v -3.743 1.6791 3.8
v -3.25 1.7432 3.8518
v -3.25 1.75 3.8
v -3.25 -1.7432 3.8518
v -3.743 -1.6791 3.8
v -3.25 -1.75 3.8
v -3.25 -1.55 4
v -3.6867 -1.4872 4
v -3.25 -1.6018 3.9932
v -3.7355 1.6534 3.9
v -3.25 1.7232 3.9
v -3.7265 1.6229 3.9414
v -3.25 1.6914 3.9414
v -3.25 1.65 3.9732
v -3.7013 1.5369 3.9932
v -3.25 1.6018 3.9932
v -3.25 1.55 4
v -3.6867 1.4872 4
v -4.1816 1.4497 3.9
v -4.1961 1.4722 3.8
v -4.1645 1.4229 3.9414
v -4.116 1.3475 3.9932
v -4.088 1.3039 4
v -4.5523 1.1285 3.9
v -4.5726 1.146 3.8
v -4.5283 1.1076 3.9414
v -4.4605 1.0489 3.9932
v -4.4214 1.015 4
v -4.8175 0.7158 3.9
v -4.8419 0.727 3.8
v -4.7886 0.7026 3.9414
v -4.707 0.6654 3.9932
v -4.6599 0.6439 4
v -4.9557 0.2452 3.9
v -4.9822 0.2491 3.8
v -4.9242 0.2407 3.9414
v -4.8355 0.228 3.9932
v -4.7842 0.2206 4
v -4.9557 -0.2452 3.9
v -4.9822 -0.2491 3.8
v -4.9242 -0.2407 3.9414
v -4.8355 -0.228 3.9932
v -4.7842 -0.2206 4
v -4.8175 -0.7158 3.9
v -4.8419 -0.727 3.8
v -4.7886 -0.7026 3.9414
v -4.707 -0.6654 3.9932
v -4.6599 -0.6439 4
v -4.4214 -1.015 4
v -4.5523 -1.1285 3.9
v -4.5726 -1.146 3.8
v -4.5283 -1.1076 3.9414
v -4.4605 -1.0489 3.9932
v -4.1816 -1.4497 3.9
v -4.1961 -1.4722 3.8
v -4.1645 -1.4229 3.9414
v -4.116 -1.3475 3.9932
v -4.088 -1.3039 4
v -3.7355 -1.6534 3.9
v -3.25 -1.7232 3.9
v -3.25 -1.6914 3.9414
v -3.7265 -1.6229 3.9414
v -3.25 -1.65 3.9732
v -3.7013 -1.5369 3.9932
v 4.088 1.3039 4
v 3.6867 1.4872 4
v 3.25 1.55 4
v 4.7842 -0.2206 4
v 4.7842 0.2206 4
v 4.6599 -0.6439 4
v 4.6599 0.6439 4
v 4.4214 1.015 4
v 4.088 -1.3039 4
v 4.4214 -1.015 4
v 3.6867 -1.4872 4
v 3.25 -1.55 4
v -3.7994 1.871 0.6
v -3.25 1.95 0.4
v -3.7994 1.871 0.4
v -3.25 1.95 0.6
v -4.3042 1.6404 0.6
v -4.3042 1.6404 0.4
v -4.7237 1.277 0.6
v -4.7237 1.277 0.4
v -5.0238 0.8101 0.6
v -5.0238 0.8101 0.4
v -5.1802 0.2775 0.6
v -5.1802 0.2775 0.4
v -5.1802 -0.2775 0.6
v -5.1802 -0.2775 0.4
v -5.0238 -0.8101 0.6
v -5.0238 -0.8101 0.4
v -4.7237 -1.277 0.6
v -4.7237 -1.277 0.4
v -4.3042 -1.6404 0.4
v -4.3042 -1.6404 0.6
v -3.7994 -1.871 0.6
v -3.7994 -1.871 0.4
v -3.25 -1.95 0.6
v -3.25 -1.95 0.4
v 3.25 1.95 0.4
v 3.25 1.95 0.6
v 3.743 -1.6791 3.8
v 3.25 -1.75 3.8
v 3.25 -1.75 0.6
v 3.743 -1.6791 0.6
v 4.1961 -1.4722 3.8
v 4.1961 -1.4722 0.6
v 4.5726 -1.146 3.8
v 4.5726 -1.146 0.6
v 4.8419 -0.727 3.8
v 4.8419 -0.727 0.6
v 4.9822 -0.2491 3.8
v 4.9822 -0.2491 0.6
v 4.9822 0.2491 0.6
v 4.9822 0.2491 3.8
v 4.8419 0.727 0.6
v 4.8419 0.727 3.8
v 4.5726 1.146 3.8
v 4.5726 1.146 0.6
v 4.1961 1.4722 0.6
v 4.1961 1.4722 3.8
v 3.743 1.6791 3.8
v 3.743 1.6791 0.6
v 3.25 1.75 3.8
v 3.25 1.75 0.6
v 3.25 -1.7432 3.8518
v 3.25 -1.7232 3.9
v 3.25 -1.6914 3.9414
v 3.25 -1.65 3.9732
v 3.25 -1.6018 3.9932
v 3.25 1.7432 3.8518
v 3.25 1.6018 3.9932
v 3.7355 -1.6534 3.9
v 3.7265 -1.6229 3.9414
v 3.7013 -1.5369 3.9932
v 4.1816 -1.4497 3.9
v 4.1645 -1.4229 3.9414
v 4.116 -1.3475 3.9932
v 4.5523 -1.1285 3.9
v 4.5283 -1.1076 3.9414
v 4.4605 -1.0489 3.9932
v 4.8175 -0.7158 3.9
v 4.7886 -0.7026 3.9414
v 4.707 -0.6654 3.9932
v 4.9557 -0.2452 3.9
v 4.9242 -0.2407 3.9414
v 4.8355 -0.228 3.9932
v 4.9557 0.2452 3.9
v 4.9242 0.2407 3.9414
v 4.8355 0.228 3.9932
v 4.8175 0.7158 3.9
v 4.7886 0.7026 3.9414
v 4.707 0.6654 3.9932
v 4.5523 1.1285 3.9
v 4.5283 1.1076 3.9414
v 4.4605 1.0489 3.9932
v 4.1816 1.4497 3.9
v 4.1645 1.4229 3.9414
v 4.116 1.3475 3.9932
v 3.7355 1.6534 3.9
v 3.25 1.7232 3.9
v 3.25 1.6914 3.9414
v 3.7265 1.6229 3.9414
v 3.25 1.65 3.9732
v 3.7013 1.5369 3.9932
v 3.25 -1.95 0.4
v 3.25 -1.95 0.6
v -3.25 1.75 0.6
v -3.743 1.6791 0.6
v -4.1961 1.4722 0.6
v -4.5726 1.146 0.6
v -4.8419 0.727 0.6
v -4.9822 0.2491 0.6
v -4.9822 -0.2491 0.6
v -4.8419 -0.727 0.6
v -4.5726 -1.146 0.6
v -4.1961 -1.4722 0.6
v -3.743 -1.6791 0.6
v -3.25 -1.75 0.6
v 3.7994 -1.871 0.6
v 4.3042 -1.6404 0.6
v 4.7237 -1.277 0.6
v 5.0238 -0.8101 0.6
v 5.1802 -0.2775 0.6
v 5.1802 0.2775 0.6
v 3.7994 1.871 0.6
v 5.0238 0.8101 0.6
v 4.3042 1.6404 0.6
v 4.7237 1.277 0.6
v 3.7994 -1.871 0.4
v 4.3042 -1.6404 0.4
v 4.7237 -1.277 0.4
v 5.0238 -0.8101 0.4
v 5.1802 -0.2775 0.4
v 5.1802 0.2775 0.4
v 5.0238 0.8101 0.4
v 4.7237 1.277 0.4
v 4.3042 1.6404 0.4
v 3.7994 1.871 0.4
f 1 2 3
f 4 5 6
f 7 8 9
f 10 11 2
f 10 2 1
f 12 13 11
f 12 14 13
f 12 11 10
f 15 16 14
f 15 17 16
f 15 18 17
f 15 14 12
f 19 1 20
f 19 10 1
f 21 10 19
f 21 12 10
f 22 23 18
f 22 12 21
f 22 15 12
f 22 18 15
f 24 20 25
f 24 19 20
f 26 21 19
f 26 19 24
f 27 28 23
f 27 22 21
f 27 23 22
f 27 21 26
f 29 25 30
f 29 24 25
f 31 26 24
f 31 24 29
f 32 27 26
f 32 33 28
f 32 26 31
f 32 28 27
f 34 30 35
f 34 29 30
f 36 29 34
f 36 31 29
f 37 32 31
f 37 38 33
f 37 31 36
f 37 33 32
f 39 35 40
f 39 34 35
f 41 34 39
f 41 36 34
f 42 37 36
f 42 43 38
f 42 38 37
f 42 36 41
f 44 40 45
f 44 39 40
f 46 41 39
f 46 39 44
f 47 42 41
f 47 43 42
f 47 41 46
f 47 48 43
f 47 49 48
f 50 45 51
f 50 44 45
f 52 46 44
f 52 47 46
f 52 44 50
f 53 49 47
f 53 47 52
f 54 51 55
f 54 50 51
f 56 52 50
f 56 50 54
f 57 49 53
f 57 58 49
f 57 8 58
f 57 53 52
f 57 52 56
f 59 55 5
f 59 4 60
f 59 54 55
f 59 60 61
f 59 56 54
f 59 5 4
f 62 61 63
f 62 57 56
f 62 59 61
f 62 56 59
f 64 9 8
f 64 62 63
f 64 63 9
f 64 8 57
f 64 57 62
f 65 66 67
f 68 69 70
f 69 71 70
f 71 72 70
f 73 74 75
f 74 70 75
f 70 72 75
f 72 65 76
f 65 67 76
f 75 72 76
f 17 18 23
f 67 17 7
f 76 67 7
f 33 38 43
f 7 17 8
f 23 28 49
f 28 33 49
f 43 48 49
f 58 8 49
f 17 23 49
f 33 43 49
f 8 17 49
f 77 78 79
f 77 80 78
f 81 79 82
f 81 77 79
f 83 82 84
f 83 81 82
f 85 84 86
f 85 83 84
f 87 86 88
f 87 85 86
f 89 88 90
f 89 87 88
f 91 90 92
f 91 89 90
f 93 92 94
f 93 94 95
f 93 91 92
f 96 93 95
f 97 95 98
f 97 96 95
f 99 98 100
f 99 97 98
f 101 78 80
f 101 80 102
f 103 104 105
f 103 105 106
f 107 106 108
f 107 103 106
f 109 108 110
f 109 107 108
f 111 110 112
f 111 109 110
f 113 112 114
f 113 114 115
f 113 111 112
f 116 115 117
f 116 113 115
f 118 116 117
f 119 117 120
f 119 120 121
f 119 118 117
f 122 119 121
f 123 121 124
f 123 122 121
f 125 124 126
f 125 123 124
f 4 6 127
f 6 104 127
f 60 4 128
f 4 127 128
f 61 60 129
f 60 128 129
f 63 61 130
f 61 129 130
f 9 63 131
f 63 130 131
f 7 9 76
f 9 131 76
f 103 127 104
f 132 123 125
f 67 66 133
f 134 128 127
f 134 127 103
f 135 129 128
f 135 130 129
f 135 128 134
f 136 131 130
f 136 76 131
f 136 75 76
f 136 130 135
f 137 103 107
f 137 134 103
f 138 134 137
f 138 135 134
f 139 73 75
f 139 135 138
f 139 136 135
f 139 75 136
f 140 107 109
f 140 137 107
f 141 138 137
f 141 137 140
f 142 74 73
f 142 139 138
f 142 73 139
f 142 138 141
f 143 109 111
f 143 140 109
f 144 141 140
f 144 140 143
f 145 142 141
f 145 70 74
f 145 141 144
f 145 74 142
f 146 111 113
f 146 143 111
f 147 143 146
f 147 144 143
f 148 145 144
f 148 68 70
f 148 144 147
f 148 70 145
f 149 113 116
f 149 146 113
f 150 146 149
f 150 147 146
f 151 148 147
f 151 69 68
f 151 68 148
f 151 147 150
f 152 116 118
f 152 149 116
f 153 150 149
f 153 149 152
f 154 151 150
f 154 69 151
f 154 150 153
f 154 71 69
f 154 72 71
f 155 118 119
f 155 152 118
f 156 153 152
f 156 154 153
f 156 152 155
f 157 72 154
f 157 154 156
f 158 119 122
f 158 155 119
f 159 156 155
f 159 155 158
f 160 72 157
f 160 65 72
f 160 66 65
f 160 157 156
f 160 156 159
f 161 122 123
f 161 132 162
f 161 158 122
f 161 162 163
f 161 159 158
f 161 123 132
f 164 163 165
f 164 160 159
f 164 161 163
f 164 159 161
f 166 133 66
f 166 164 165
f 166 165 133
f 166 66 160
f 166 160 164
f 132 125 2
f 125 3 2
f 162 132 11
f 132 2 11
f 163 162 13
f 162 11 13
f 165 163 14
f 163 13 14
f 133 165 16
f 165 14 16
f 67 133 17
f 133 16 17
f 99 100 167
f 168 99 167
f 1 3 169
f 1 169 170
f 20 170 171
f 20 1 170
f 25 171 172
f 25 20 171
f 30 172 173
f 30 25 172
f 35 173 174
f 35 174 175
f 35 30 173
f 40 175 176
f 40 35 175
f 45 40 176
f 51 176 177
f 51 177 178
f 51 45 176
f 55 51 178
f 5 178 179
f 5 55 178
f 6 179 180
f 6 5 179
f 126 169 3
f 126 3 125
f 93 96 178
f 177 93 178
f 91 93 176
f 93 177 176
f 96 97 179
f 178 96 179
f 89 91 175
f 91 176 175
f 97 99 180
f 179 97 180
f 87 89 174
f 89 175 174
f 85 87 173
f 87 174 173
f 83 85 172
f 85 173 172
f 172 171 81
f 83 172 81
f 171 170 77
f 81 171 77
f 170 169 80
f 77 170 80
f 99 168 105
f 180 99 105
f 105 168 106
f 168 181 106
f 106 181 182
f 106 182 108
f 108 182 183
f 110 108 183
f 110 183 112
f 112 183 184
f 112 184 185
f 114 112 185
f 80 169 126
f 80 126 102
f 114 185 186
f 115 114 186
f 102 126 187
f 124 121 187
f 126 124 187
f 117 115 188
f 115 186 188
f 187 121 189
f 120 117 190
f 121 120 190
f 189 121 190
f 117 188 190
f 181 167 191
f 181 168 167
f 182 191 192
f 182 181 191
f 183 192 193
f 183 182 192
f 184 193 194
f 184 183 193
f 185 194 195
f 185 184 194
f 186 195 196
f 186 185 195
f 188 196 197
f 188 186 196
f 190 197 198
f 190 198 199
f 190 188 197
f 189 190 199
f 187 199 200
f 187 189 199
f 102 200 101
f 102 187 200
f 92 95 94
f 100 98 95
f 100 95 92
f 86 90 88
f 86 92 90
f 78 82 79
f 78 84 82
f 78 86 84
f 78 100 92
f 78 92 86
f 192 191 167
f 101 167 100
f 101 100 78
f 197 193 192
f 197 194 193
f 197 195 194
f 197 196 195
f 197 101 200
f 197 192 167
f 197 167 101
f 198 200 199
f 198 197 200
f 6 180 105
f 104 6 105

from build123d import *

# Parameters (mm, degrees)
CYLINDER005_W     = 1.75
CYLINDER005_H     = 3.4
CYLINDER005_ANGLE = 180
CYLINDER004_W     = 1.75
CYLINDER004_H     = 3.4
CYLINDER004_ANGLE = 180
BOX010_W          = 6.5
BOX010_H          = 3.9
BOX010_DEPTH      = 0.2
CYLINDER006_W     = 1.95
CYLINDER006_H     = 0.2
CYLINDER006_ANGLE = 180
CYLINDER007_W     = 1.95
CYLINDER007_H     = 0.2
CYLINDER007_ANGLE = 180
BOX009_W          = 6.5
BOX009_H          = 3.5
BOX009_DEPTH      = 3.4
FILLET001_R       = 0.2


with BuildPart() as cylinder005:
    # Cylinder005 → Cylinder005 (revolve)
    with BuildSketch(Plane(origin=(3.25, 0, 0.6), x_dir=(0, -1, 0), z_dir=(-1, 0, 0))):
        with Locations((0.875, 1.7)):
            Rectangle(CYLINDER005_W, CYLINDER005_H)
    revolve(axis=Axis((3.25, 0, 0.6), (0, 0, 1)), revolution_arc=CYLINDER005_ANGLE)


with BuildPart() as cylinder004:
    # Cylinder004 → Cylinder004 (revolve)
    with BuildSketch(Plane(origin=(-3.25, 0, 0.6), x_dir=(0, 1, 0), z_dir=(1, 0, 0))):
        with Locations((0.875, 1.7)):
            Rectangle(CYLINDER004_W, CYLINDER004_H)
    revolve(axis=Axis((-3.25, 0, 0.6), (0, 0, 1)), revolution_arc=CYLINDER004_ANGLE)


with BuildPart() as cube008:
    # Box010 → Box010 (new body)
    with BuildSketch(Plane(origin=(-3.25, -1.95, 0.4), x_dir=(1, 0, 0), z_dir=(0, 0, 1))):
        with Locations((3.25, 1.95)):
            Rectangle(BOX010_W, BOX010_H)
    extrude(amount=BOX010_DEPTH)


with BuildPart() as cylinder006:
    # Cylinder006 → Cylinder006 (revolve)
    with BuildSketch(Plane(origin=(-3.25, 0, 0.4), x_dir=(0, 1, 0), z_dir=(1, 0, 0))):
        with Locations((0.975, 0.1)):
            Rectangle(CYLINDER006_W, CYLINDER006_H)
    revolve(axis=Axis((-3.25, 0, 0.4), (0, 0, 1)), revolution_arc=CYLINDER006_ANGLE)


with BuildPart() as cylinder007:
    # Cylinder007 → Cylinder007 (revolve)
    with BuildSketch(Plane(origin=(3.25, 0, 0.4), x_dir=(0, -1, 0), z_dir=(-1, 0, 0))):
        with Locations((0.975, 0.1)):
            Rectangle(CYLINDER007_W, CYLINDER007_H)
    revolve(axis=Axis((3.25, 0, 0.4), (0, 0, 1)), revolution_arc=CYLINDER007_ANGLE)


with BuildPart() as cap:
    # Box009 → Box009 (new body)
    with BuildSketch(Plane(origin=(-3.25, -1.75, 0.6), x_dir=(1, 0, 0), z_dir=(0, 0, 1))):
        with Locations((3.25, 1.75)):
            Rectangle(BOX009_W, BOX009_H)
    extrude(amount=BOX009_DEPTH)

    # Fusion001: union Cylinder005, Cylinder004, Cube008, Cylinder006, Cylinder007
    add(cylinder005.part)
    add(cylinder004.part)
    add(cube008.part)
    add(cylinder006.part)
    add(cylinder007.part)

    # Fillet001
    fillet001_edges = [cap.edges().sort_by_distance(p)[0] for p in [
        (0, -1.75, 4),
        (5, 0, 4),
        (0, 1.75, 4),
        (-5, 0, 4),
    ]]
    fillet(fillet001_edges, radius=FILLET001_R)


solid = cap.part
